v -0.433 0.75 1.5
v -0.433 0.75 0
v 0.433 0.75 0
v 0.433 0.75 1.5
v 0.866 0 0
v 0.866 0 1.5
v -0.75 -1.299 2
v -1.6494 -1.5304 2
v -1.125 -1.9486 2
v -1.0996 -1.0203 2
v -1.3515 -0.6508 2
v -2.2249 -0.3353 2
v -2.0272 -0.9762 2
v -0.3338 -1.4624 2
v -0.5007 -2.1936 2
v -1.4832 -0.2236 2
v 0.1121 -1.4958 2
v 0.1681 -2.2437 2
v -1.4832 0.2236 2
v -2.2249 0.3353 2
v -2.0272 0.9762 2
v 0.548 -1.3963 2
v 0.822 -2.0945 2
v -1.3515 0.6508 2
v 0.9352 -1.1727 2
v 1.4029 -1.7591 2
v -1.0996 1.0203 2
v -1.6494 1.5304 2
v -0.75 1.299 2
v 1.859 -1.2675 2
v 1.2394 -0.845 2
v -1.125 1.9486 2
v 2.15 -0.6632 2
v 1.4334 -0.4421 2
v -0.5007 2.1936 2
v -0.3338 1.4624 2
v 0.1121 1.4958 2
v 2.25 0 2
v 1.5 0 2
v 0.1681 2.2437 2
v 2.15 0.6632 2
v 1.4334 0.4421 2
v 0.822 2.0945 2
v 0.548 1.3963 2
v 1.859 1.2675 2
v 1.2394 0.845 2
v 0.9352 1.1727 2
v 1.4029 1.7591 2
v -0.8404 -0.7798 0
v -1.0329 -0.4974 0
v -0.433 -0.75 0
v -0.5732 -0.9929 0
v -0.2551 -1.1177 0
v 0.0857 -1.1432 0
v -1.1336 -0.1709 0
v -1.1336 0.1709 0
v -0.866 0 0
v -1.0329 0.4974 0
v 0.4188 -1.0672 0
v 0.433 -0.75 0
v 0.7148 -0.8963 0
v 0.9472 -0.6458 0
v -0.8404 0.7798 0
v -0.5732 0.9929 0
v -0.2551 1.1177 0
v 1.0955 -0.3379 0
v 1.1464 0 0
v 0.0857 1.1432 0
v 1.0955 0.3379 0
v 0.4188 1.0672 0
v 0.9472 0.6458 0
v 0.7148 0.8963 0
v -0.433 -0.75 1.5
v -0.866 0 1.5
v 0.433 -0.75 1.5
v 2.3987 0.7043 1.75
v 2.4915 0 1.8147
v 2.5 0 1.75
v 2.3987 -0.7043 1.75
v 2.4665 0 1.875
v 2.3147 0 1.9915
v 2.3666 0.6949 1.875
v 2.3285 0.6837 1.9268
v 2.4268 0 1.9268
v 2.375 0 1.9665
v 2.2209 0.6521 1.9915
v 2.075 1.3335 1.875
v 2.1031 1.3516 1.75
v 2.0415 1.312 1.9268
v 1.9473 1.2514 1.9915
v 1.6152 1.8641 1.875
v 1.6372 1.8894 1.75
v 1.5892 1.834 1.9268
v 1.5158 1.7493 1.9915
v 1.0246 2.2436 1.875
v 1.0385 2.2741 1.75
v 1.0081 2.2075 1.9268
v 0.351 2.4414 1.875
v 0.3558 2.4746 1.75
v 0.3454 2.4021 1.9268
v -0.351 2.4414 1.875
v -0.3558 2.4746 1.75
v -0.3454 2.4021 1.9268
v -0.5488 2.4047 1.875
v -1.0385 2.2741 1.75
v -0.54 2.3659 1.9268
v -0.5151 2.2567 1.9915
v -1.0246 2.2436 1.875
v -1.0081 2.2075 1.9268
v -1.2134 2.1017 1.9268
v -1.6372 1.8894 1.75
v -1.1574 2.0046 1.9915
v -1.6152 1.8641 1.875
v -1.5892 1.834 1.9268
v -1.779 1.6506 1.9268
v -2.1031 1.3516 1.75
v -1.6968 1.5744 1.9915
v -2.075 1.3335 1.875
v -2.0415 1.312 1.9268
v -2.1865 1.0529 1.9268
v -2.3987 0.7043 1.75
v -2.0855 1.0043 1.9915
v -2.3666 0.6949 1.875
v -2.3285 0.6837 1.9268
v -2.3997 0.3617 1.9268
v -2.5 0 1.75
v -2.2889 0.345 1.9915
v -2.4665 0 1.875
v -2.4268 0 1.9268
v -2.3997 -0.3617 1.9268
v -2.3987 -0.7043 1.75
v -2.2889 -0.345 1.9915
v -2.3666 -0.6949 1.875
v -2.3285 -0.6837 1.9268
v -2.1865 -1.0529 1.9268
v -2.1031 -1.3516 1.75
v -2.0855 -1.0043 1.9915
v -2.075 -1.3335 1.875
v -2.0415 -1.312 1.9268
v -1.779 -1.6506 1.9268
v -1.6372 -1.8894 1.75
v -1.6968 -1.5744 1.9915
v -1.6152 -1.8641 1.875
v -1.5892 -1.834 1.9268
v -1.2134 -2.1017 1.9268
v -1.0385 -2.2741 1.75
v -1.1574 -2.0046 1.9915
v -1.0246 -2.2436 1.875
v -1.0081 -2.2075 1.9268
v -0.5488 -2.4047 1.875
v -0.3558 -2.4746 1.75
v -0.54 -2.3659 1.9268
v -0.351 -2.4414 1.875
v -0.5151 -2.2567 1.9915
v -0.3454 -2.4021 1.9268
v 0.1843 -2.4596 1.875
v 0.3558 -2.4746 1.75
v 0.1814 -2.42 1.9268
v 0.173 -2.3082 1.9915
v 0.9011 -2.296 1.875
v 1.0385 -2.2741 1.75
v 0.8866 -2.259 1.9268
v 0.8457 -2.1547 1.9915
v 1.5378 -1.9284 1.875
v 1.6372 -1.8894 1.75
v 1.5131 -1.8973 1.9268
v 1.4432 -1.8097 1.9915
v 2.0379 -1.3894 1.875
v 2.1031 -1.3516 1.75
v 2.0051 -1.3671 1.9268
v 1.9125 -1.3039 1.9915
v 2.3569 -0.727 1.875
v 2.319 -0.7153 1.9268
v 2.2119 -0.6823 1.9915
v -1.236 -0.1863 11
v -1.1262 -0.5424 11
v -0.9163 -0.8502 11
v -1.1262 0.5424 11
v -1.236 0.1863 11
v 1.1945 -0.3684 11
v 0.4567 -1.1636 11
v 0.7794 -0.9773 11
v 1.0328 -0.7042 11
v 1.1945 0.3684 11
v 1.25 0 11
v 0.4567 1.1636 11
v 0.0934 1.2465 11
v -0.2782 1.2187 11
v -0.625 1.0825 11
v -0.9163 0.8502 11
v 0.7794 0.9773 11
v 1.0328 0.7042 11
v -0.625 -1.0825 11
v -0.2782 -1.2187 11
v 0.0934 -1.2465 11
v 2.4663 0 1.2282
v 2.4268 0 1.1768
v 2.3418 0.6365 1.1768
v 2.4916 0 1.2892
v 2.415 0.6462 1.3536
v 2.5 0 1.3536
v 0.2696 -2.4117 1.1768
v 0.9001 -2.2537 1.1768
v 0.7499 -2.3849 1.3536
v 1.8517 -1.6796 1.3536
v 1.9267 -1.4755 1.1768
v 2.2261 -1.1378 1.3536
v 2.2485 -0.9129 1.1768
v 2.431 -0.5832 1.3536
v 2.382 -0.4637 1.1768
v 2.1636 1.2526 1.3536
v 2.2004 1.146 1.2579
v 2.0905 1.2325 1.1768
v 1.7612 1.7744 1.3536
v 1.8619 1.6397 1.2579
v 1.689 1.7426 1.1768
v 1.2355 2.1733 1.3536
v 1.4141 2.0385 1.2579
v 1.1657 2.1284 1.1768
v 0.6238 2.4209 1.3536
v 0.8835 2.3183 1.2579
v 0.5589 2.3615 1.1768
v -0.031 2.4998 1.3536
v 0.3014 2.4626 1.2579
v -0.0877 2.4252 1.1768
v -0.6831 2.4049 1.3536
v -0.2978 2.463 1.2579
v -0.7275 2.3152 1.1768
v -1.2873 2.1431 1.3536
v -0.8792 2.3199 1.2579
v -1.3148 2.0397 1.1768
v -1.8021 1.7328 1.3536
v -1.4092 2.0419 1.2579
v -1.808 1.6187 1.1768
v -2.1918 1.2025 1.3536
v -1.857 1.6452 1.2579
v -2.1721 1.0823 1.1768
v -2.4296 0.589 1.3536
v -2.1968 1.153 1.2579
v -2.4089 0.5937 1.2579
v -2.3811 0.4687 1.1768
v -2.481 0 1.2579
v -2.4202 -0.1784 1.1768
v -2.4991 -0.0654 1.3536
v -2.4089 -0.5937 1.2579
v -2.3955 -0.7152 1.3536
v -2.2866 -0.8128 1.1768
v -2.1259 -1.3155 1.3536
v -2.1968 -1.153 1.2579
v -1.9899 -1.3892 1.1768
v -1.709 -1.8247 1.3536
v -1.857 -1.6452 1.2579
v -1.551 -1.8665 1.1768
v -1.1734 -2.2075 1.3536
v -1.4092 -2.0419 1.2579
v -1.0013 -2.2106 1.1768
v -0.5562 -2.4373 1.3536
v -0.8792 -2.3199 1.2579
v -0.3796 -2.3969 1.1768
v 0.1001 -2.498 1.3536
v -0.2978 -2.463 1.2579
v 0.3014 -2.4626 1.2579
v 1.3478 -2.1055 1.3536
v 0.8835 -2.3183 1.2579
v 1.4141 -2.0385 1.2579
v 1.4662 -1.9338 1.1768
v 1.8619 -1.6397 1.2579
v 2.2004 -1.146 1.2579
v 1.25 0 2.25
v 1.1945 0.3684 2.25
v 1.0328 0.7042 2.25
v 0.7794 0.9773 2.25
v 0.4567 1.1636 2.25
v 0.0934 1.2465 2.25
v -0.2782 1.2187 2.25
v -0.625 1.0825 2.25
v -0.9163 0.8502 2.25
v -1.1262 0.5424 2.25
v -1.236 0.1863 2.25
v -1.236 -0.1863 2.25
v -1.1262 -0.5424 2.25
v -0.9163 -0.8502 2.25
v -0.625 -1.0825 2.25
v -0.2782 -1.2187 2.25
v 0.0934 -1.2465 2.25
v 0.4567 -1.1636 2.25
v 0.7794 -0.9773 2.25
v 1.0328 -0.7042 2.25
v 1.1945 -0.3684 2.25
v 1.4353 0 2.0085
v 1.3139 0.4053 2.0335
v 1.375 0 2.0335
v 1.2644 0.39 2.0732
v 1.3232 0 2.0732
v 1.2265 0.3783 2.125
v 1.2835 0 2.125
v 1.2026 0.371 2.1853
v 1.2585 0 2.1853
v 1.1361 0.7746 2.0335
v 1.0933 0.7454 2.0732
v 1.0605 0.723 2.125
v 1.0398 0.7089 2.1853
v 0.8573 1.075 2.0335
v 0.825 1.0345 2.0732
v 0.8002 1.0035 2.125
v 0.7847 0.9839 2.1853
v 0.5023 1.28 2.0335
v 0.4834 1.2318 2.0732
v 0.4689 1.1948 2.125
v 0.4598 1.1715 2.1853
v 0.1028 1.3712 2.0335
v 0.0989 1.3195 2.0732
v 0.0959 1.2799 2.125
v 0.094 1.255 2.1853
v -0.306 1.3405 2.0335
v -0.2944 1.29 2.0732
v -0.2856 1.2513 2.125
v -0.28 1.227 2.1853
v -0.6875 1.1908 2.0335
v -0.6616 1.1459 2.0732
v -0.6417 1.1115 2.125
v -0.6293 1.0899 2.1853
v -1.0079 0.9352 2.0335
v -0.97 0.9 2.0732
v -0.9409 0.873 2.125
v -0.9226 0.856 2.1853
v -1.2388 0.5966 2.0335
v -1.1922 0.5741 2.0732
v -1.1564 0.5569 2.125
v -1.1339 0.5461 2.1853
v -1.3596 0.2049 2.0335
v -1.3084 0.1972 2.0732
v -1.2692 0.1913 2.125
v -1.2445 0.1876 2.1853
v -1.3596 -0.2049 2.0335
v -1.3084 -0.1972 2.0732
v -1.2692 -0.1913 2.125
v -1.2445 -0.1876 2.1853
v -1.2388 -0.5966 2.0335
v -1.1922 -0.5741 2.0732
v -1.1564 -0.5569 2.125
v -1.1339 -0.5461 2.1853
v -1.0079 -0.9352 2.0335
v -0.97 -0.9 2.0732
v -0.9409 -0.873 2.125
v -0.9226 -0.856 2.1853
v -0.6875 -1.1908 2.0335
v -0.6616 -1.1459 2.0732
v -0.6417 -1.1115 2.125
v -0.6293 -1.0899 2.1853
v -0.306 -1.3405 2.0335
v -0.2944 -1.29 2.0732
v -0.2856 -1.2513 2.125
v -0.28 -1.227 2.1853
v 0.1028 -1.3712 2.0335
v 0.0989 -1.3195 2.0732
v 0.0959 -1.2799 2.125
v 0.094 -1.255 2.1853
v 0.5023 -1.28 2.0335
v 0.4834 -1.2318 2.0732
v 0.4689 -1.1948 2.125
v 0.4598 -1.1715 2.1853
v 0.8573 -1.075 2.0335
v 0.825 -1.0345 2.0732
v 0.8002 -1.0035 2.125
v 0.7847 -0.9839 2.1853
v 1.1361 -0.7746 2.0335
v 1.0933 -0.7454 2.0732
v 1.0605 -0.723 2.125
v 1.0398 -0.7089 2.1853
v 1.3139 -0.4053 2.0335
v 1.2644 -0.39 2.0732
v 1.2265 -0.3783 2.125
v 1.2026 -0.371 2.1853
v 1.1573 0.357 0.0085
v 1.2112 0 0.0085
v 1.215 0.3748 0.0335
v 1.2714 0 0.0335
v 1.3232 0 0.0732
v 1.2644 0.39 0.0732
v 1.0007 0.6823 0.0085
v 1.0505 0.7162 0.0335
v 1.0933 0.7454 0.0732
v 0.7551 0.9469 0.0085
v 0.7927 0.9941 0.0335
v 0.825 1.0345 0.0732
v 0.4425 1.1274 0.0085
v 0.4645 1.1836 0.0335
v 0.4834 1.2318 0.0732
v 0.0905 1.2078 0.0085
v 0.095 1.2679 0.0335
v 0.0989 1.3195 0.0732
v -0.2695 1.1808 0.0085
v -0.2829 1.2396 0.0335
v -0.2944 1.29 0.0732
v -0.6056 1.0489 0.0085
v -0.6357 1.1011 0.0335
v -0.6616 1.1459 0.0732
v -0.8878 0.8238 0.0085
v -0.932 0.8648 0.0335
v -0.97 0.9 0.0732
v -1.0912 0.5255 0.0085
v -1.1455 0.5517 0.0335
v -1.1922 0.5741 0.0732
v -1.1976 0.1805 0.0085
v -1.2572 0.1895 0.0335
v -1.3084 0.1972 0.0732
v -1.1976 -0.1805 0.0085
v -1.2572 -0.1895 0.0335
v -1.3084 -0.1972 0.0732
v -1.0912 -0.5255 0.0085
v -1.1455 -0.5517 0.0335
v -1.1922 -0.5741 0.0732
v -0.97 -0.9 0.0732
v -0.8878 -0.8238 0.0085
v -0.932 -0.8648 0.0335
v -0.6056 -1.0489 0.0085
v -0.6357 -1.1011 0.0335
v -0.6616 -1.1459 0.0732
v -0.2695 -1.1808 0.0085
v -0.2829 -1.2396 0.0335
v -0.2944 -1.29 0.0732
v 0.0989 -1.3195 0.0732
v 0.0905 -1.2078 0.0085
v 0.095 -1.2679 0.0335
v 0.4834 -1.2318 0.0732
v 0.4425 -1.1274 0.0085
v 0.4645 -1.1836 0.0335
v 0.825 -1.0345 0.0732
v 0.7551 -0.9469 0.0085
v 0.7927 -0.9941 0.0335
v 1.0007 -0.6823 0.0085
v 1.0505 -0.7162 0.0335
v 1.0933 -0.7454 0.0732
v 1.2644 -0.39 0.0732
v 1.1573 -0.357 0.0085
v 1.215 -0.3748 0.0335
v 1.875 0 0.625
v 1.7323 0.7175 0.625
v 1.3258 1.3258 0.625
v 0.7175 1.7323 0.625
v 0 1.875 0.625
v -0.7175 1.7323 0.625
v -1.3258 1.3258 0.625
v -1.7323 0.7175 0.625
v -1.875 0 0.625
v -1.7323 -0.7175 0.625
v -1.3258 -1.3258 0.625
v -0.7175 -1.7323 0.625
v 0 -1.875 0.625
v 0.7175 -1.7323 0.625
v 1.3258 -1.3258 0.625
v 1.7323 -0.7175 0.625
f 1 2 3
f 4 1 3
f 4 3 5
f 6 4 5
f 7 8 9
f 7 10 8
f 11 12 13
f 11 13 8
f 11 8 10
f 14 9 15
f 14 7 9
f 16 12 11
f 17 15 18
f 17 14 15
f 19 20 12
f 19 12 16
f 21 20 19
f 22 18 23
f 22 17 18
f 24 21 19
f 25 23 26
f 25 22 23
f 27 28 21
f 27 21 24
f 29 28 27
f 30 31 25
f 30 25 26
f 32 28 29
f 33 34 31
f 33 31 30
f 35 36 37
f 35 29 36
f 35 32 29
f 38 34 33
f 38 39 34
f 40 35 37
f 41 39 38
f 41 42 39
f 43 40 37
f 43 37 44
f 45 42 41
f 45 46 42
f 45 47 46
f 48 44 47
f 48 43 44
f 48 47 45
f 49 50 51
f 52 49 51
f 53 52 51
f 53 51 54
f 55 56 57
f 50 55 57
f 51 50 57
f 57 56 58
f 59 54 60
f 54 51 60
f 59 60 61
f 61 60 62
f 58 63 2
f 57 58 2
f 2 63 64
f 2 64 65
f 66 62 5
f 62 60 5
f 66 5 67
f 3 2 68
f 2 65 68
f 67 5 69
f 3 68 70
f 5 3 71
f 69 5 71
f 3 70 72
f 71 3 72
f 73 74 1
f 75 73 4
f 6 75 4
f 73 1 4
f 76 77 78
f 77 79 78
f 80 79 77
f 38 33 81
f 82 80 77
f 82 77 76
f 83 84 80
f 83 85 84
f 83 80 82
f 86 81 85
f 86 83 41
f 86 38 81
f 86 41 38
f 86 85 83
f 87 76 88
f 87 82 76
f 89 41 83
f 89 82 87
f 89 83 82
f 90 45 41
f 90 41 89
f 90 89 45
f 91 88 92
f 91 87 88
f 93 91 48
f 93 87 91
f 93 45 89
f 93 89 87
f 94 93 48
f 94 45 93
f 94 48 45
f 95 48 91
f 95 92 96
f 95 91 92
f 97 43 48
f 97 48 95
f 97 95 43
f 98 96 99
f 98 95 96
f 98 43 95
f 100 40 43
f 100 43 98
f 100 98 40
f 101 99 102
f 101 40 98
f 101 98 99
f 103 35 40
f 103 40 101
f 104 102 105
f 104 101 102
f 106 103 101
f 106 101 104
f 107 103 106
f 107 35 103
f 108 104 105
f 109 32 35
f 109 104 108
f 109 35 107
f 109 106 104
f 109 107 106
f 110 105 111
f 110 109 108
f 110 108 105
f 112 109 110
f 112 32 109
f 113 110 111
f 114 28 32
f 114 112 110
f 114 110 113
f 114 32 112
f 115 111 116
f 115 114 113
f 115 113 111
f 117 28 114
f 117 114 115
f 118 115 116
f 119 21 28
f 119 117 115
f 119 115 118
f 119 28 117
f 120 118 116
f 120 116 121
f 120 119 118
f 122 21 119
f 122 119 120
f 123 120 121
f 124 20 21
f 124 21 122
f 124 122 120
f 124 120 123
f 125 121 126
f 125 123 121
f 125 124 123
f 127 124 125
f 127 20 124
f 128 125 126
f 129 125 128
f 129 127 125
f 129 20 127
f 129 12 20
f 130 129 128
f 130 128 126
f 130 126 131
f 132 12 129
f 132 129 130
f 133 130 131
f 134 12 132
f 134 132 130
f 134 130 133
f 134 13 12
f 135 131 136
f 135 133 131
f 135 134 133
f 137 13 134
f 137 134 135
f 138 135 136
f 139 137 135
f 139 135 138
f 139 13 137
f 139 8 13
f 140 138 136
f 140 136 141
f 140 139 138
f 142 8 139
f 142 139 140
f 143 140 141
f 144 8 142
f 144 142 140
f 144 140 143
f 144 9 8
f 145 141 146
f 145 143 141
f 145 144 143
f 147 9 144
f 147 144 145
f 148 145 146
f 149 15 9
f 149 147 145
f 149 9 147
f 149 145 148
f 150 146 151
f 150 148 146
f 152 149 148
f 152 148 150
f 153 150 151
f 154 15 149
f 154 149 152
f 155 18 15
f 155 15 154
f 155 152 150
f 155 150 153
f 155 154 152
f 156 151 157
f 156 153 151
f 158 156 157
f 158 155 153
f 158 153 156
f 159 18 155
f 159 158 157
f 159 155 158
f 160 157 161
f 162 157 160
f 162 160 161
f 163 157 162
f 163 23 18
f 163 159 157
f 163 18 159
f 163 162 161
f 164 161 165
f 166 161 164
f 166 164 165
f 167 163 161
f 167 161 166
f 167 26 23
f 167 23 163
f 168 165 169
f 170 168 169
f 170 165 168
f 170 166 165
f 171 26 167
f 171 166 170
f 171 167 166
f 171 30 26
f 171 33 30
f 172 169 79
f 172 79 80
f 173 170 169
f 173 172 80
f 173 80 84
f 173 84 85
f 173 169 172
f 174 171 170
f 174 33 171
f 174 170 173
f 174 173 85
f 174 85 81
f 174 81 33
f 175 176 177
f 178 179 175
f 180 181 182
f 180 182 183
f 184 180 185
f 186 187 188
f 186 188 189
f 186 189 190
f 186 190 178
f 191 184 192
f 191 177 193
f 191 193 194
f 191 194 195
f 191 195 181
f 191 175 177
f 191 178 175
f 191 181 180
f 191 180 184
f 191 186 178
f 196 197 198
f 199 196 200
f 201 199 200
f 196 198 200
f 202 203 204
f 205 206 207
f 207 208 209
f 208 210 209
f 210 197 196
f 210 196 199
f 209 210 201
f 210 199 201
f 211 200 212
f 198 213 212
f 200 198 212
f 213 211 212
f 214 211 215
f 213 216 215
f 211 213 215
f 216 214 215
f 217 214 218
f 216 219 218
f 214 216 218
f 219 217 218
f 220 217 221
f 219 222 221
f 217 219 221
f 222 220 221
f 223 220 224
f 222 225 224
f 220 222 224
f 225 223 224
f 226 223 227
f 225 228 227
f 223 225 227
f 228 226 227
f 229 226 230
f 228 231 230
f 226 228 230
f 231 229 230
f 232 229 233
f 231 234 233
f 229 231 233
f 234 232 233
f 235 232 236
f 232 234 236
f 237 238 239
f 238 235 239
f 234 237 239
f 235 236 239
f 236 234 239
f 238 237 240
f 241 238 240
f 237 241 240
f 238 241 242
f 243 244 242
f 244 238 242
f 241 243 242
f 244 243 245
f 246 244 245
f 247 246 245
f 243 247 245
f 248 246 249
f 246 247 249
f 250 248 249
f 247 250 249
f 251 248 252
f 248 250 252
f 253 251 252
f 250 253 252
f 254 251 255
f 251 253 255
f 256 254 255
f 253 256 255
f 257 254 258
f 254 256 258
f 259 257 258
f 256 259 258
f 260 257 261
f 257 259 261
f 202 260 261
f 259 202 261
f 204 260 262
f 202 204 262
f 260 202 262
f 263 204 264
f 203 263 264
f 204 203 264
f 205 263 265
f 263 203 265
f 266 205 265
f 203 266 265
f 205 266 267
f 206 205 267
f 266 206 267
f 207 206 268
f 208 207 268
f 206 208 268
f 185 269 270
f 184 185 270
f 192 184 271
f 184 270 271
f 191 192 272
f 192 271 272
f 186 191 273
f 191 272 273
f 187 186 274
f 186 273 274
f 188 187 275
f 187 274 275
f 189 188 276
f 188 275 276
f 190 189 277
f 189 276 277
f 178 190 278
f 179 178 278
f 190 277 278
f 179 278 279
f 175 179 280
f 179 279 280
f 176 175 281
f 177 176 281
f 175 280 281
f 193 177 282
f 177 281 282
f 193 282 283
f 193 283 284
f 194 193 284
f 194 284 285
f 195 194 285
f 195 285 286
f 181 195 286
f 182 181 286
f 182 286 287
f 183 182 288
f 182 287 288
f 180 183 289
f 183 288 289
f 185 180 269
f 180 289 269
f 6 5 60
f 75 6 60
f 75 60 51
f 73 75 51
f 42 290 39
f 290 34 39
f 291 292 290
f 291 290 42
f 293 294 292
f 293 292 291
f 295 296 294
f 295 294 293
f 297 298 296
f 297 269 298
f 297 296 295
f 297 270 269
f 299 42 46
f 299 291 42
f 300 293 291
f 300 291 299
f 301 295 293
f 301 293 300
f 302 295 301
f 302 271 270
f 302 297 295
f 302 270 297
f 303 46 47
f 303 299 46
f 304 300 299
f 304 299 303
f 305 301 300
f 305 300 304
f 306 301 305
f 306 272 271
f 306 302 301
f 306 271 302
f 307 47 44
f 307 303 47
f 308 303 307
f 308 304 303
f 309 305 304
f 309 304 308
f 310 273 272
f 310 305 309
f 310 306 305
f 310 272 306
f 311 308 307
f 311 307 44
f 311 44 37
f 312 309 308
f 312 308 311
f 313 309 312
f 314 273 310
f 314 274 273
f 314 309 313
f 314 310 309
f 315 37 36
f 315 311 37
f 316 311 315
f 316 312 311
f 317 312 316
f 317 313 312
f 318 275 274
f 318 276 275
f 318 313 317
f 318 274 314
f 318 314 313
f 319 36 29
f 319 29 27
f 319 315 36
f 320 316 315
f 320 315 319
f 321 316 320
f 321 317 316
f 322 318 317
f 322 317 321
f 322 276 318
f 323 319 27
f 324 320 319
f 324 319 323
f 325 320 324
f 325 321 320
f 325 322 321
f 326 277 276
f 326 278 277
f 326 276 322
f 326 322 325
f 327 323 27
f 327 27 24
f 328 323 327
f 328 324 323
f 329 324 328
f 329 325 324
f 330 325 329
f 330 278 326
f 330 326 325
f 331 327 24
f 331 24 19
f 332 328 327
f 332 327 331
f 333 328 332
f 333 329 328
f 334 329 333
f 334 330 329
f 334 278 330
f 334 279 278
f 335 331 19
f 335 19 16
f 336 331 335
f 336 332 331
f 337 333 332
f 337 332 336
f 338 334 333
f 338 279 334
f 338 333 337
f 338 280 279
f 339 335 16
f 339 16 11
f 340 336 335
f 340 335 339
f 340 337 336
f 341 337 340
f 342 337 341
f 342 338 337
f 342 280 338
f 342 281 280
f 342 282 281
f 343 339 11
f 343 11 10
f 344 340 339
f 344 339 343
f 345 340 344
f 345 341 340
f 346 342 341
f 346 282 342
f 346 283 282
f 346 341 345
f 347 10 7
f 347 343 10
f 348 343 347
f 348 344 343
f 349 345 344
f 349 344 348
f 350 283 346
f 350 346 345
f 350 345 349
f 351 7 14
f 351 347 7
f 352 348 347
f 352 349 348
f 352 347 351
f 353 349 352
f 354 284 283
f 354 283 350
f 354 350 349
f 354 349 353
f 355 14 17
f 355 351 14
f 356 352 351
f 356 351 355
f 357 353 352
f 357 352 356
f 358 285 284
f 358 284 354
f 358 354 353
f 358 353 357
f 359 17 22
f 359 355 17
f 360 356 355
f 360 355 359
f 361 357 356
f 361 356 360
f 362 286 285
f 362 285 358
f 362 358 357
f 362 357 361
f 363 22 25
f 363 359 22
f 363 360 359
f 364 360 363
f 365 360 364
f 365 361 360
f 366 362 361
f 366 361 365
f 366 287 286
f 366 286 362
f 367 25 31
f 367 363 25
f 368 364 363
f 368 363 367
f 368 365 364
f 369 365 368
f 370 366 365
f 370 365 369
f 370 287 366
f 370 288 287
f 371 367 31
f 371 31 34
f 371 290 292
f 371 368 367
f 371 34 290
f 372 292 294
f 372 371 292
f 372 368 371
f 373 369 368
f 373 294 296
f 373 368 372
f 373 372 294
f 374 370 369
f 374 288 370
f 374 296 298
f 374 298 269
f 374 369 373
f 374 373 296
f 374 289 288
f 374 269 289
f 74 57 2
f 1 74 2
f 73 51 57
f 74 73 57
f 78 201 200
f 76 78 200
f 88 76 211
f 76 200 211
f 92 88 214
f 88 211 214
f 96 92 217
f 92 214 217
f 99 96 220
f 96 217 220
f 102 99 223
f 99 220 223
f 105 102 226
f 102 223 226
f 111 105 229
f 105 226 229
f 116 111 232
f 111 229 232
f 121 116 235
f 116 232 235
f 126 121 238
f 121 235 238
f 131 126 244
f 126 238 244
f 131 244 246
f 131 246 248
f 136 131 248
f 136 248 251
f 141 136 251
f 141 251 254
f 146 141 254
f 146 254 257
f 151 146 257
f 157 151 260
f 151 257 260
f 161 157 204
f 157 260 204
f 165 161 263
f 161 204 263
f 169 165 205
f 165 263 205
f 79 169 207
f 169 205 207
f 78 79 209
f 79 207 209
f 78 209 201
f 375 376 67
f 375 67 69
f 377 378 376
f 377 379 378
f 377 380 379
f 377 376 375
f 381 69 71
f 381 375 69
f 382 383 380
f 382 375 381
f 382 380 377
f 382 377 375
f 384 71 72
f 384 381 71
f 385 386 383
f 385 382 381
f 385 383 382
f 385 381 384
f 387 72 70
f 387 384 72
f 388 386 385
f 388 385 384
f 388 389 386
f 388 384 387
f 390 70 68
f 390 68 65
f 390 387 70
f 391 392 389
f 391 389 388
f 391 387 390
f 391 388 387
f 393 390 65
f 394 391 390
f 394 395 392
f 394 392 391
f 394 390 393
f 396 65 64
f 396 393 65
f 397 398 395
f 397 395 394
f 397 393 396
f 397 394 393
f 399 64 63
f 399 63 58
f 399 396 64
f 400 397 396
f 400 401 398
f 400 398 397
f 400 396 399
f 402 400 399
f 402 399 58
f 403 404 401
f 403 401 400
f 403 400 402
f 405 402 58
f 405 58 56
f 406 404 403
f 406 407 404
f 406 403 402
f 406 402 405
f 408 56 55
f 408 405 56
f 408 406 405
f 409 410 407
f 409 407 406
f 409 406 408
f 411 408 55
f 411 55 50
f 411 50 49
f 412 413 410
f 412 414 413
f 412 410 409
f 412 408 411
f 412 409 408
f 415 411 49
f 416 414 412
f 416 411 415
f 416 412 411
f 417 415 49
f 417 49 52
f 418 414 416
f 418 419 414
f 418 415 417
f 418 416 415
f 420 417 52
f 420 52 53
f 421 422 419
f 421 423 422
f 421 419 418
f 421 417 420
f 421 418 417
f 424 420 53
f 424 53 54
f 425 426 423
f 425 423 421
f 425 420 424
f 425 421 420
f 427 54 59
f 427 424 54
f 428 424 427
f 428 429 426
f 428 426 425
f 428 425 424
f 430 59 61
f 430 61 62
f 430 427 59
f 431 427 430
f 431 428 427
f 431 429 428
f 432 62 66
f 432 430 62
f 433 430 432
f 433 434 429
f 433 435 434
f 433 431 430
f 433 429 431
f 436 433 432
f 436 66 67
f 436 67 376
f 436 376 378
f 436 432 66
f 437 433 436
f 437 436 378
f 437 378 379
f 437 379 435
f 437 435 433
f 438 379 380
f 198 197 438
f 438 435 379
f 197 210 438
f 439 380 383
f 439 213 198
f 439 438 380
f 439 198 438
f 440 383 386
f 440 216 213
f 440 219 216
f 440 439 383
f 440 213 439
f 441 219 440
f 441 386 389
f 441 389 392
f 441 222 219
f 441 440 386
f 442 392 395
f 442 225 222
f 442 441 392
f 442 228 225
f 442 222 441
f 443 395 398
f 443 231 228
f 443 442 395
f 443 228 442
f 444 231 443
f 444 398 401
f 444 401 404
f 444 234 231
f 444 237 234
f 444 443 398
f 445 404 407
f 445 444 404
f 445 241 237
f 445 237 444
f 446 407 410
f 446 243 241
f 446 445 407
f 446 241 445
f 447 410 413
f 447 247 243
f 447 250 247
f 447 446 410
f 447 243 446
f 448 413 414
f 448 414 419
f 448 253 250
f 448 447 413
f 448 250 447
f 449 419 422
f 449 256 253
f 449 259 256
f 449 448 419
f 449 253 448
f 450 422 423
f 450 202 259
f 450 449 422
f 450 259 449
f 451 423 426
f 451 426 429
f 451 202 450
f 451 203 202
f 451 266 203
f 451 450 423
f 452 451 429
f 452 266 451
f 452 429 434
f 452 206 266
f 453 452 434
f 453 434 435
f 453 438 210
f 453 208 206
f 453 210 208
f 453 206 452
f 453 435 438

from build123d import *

# Parameters (mm, degrees)
F1_R     = 2.5
F1_R_2   = 1.25
F2_DEPTH = 2
F3_START = 1.5
F3_DEPTH = 0.5
F4_START = 2
F4_DEPTH = 9
F5_SIZE2 = 1.25
F5_SIZE  = 1.25
F6_R     = 0.25


# Not quite as in the source:
# - a feature names something its author has since deleted; it is built from what else it names


with BuildPart() as f2:
    # F1 (on Top) → F2 (new body)
    with BuildSketch(Plane.XY):
        Circle(F1_R)
        Circle(F1_R_2, mode=Mode.SUBTRACT)
        Circle(F1_R_2)
        Polygon((-0.4330127019, -0.75), (-0.8660254038, 0), (-0.4330127019, 0.75), (0.4330127019, 0.75), (0.8660254038, 0), (0.4330127019, -0.75), align=None, mode=Mode.SUBTRACT)
    extrude(amount=F2_DEPTH)

    # F1 (on Top) → F3 (join)
    with BuildSketch(Plane.XY.offset(F3_START)):
        Polygon((-0.4330127019, 0.75), (-0.8660254038, 0), (-0.4330127019, -0.75), (0.4330127019, -0.75), (0.8660254038, 0), (0.4330127019, 0.75), align=None)
    extrude(amount=F3_DEPTH)

    # F1 (on Top) → F4 (join)
    with BuildSketch(Plane.XY.offset(F4_START)):
        Circle(F1_R_2)
        Polygon((-0.4330127019, -0.75), (-0.8660254038, 0), (-0.4330127019, 0.75), (0.4330127019, 0.75), (0.8660254038, 0), (0.4330127019, -0.75), align=None, mode=Mode.SUBTRACT)
        Polygon((-0.4330127019, 0.75), (-0.8660254038, 0), (-0.4330127019, -0.75), (0.4330127019, -0.75), (0.8660254038, 0), (0.4330127019, 0.75), align=None)
    extrude(amount=F4_DEPTH)

    # F5
    f5_edges = [f2.edges().sort_by_distance(p)[0] for p in [
        (-2.5, 0, 0),
    ]]
    chamfer(f5_edges, length=F5_SIZE, length2=F5_SIZE2)

    # F6
    f6_edges = [f2.edges().sort_by_distance(p)[0] for p in [
        (-2.5, 0, 2),
        (-1.25, 0, 2),
        (-1.25, 0, 0),
        (-2.5, 0, 1.25),
    ]]
    fillet(f6_edges, radius=F6_R)


solid = f2.part
